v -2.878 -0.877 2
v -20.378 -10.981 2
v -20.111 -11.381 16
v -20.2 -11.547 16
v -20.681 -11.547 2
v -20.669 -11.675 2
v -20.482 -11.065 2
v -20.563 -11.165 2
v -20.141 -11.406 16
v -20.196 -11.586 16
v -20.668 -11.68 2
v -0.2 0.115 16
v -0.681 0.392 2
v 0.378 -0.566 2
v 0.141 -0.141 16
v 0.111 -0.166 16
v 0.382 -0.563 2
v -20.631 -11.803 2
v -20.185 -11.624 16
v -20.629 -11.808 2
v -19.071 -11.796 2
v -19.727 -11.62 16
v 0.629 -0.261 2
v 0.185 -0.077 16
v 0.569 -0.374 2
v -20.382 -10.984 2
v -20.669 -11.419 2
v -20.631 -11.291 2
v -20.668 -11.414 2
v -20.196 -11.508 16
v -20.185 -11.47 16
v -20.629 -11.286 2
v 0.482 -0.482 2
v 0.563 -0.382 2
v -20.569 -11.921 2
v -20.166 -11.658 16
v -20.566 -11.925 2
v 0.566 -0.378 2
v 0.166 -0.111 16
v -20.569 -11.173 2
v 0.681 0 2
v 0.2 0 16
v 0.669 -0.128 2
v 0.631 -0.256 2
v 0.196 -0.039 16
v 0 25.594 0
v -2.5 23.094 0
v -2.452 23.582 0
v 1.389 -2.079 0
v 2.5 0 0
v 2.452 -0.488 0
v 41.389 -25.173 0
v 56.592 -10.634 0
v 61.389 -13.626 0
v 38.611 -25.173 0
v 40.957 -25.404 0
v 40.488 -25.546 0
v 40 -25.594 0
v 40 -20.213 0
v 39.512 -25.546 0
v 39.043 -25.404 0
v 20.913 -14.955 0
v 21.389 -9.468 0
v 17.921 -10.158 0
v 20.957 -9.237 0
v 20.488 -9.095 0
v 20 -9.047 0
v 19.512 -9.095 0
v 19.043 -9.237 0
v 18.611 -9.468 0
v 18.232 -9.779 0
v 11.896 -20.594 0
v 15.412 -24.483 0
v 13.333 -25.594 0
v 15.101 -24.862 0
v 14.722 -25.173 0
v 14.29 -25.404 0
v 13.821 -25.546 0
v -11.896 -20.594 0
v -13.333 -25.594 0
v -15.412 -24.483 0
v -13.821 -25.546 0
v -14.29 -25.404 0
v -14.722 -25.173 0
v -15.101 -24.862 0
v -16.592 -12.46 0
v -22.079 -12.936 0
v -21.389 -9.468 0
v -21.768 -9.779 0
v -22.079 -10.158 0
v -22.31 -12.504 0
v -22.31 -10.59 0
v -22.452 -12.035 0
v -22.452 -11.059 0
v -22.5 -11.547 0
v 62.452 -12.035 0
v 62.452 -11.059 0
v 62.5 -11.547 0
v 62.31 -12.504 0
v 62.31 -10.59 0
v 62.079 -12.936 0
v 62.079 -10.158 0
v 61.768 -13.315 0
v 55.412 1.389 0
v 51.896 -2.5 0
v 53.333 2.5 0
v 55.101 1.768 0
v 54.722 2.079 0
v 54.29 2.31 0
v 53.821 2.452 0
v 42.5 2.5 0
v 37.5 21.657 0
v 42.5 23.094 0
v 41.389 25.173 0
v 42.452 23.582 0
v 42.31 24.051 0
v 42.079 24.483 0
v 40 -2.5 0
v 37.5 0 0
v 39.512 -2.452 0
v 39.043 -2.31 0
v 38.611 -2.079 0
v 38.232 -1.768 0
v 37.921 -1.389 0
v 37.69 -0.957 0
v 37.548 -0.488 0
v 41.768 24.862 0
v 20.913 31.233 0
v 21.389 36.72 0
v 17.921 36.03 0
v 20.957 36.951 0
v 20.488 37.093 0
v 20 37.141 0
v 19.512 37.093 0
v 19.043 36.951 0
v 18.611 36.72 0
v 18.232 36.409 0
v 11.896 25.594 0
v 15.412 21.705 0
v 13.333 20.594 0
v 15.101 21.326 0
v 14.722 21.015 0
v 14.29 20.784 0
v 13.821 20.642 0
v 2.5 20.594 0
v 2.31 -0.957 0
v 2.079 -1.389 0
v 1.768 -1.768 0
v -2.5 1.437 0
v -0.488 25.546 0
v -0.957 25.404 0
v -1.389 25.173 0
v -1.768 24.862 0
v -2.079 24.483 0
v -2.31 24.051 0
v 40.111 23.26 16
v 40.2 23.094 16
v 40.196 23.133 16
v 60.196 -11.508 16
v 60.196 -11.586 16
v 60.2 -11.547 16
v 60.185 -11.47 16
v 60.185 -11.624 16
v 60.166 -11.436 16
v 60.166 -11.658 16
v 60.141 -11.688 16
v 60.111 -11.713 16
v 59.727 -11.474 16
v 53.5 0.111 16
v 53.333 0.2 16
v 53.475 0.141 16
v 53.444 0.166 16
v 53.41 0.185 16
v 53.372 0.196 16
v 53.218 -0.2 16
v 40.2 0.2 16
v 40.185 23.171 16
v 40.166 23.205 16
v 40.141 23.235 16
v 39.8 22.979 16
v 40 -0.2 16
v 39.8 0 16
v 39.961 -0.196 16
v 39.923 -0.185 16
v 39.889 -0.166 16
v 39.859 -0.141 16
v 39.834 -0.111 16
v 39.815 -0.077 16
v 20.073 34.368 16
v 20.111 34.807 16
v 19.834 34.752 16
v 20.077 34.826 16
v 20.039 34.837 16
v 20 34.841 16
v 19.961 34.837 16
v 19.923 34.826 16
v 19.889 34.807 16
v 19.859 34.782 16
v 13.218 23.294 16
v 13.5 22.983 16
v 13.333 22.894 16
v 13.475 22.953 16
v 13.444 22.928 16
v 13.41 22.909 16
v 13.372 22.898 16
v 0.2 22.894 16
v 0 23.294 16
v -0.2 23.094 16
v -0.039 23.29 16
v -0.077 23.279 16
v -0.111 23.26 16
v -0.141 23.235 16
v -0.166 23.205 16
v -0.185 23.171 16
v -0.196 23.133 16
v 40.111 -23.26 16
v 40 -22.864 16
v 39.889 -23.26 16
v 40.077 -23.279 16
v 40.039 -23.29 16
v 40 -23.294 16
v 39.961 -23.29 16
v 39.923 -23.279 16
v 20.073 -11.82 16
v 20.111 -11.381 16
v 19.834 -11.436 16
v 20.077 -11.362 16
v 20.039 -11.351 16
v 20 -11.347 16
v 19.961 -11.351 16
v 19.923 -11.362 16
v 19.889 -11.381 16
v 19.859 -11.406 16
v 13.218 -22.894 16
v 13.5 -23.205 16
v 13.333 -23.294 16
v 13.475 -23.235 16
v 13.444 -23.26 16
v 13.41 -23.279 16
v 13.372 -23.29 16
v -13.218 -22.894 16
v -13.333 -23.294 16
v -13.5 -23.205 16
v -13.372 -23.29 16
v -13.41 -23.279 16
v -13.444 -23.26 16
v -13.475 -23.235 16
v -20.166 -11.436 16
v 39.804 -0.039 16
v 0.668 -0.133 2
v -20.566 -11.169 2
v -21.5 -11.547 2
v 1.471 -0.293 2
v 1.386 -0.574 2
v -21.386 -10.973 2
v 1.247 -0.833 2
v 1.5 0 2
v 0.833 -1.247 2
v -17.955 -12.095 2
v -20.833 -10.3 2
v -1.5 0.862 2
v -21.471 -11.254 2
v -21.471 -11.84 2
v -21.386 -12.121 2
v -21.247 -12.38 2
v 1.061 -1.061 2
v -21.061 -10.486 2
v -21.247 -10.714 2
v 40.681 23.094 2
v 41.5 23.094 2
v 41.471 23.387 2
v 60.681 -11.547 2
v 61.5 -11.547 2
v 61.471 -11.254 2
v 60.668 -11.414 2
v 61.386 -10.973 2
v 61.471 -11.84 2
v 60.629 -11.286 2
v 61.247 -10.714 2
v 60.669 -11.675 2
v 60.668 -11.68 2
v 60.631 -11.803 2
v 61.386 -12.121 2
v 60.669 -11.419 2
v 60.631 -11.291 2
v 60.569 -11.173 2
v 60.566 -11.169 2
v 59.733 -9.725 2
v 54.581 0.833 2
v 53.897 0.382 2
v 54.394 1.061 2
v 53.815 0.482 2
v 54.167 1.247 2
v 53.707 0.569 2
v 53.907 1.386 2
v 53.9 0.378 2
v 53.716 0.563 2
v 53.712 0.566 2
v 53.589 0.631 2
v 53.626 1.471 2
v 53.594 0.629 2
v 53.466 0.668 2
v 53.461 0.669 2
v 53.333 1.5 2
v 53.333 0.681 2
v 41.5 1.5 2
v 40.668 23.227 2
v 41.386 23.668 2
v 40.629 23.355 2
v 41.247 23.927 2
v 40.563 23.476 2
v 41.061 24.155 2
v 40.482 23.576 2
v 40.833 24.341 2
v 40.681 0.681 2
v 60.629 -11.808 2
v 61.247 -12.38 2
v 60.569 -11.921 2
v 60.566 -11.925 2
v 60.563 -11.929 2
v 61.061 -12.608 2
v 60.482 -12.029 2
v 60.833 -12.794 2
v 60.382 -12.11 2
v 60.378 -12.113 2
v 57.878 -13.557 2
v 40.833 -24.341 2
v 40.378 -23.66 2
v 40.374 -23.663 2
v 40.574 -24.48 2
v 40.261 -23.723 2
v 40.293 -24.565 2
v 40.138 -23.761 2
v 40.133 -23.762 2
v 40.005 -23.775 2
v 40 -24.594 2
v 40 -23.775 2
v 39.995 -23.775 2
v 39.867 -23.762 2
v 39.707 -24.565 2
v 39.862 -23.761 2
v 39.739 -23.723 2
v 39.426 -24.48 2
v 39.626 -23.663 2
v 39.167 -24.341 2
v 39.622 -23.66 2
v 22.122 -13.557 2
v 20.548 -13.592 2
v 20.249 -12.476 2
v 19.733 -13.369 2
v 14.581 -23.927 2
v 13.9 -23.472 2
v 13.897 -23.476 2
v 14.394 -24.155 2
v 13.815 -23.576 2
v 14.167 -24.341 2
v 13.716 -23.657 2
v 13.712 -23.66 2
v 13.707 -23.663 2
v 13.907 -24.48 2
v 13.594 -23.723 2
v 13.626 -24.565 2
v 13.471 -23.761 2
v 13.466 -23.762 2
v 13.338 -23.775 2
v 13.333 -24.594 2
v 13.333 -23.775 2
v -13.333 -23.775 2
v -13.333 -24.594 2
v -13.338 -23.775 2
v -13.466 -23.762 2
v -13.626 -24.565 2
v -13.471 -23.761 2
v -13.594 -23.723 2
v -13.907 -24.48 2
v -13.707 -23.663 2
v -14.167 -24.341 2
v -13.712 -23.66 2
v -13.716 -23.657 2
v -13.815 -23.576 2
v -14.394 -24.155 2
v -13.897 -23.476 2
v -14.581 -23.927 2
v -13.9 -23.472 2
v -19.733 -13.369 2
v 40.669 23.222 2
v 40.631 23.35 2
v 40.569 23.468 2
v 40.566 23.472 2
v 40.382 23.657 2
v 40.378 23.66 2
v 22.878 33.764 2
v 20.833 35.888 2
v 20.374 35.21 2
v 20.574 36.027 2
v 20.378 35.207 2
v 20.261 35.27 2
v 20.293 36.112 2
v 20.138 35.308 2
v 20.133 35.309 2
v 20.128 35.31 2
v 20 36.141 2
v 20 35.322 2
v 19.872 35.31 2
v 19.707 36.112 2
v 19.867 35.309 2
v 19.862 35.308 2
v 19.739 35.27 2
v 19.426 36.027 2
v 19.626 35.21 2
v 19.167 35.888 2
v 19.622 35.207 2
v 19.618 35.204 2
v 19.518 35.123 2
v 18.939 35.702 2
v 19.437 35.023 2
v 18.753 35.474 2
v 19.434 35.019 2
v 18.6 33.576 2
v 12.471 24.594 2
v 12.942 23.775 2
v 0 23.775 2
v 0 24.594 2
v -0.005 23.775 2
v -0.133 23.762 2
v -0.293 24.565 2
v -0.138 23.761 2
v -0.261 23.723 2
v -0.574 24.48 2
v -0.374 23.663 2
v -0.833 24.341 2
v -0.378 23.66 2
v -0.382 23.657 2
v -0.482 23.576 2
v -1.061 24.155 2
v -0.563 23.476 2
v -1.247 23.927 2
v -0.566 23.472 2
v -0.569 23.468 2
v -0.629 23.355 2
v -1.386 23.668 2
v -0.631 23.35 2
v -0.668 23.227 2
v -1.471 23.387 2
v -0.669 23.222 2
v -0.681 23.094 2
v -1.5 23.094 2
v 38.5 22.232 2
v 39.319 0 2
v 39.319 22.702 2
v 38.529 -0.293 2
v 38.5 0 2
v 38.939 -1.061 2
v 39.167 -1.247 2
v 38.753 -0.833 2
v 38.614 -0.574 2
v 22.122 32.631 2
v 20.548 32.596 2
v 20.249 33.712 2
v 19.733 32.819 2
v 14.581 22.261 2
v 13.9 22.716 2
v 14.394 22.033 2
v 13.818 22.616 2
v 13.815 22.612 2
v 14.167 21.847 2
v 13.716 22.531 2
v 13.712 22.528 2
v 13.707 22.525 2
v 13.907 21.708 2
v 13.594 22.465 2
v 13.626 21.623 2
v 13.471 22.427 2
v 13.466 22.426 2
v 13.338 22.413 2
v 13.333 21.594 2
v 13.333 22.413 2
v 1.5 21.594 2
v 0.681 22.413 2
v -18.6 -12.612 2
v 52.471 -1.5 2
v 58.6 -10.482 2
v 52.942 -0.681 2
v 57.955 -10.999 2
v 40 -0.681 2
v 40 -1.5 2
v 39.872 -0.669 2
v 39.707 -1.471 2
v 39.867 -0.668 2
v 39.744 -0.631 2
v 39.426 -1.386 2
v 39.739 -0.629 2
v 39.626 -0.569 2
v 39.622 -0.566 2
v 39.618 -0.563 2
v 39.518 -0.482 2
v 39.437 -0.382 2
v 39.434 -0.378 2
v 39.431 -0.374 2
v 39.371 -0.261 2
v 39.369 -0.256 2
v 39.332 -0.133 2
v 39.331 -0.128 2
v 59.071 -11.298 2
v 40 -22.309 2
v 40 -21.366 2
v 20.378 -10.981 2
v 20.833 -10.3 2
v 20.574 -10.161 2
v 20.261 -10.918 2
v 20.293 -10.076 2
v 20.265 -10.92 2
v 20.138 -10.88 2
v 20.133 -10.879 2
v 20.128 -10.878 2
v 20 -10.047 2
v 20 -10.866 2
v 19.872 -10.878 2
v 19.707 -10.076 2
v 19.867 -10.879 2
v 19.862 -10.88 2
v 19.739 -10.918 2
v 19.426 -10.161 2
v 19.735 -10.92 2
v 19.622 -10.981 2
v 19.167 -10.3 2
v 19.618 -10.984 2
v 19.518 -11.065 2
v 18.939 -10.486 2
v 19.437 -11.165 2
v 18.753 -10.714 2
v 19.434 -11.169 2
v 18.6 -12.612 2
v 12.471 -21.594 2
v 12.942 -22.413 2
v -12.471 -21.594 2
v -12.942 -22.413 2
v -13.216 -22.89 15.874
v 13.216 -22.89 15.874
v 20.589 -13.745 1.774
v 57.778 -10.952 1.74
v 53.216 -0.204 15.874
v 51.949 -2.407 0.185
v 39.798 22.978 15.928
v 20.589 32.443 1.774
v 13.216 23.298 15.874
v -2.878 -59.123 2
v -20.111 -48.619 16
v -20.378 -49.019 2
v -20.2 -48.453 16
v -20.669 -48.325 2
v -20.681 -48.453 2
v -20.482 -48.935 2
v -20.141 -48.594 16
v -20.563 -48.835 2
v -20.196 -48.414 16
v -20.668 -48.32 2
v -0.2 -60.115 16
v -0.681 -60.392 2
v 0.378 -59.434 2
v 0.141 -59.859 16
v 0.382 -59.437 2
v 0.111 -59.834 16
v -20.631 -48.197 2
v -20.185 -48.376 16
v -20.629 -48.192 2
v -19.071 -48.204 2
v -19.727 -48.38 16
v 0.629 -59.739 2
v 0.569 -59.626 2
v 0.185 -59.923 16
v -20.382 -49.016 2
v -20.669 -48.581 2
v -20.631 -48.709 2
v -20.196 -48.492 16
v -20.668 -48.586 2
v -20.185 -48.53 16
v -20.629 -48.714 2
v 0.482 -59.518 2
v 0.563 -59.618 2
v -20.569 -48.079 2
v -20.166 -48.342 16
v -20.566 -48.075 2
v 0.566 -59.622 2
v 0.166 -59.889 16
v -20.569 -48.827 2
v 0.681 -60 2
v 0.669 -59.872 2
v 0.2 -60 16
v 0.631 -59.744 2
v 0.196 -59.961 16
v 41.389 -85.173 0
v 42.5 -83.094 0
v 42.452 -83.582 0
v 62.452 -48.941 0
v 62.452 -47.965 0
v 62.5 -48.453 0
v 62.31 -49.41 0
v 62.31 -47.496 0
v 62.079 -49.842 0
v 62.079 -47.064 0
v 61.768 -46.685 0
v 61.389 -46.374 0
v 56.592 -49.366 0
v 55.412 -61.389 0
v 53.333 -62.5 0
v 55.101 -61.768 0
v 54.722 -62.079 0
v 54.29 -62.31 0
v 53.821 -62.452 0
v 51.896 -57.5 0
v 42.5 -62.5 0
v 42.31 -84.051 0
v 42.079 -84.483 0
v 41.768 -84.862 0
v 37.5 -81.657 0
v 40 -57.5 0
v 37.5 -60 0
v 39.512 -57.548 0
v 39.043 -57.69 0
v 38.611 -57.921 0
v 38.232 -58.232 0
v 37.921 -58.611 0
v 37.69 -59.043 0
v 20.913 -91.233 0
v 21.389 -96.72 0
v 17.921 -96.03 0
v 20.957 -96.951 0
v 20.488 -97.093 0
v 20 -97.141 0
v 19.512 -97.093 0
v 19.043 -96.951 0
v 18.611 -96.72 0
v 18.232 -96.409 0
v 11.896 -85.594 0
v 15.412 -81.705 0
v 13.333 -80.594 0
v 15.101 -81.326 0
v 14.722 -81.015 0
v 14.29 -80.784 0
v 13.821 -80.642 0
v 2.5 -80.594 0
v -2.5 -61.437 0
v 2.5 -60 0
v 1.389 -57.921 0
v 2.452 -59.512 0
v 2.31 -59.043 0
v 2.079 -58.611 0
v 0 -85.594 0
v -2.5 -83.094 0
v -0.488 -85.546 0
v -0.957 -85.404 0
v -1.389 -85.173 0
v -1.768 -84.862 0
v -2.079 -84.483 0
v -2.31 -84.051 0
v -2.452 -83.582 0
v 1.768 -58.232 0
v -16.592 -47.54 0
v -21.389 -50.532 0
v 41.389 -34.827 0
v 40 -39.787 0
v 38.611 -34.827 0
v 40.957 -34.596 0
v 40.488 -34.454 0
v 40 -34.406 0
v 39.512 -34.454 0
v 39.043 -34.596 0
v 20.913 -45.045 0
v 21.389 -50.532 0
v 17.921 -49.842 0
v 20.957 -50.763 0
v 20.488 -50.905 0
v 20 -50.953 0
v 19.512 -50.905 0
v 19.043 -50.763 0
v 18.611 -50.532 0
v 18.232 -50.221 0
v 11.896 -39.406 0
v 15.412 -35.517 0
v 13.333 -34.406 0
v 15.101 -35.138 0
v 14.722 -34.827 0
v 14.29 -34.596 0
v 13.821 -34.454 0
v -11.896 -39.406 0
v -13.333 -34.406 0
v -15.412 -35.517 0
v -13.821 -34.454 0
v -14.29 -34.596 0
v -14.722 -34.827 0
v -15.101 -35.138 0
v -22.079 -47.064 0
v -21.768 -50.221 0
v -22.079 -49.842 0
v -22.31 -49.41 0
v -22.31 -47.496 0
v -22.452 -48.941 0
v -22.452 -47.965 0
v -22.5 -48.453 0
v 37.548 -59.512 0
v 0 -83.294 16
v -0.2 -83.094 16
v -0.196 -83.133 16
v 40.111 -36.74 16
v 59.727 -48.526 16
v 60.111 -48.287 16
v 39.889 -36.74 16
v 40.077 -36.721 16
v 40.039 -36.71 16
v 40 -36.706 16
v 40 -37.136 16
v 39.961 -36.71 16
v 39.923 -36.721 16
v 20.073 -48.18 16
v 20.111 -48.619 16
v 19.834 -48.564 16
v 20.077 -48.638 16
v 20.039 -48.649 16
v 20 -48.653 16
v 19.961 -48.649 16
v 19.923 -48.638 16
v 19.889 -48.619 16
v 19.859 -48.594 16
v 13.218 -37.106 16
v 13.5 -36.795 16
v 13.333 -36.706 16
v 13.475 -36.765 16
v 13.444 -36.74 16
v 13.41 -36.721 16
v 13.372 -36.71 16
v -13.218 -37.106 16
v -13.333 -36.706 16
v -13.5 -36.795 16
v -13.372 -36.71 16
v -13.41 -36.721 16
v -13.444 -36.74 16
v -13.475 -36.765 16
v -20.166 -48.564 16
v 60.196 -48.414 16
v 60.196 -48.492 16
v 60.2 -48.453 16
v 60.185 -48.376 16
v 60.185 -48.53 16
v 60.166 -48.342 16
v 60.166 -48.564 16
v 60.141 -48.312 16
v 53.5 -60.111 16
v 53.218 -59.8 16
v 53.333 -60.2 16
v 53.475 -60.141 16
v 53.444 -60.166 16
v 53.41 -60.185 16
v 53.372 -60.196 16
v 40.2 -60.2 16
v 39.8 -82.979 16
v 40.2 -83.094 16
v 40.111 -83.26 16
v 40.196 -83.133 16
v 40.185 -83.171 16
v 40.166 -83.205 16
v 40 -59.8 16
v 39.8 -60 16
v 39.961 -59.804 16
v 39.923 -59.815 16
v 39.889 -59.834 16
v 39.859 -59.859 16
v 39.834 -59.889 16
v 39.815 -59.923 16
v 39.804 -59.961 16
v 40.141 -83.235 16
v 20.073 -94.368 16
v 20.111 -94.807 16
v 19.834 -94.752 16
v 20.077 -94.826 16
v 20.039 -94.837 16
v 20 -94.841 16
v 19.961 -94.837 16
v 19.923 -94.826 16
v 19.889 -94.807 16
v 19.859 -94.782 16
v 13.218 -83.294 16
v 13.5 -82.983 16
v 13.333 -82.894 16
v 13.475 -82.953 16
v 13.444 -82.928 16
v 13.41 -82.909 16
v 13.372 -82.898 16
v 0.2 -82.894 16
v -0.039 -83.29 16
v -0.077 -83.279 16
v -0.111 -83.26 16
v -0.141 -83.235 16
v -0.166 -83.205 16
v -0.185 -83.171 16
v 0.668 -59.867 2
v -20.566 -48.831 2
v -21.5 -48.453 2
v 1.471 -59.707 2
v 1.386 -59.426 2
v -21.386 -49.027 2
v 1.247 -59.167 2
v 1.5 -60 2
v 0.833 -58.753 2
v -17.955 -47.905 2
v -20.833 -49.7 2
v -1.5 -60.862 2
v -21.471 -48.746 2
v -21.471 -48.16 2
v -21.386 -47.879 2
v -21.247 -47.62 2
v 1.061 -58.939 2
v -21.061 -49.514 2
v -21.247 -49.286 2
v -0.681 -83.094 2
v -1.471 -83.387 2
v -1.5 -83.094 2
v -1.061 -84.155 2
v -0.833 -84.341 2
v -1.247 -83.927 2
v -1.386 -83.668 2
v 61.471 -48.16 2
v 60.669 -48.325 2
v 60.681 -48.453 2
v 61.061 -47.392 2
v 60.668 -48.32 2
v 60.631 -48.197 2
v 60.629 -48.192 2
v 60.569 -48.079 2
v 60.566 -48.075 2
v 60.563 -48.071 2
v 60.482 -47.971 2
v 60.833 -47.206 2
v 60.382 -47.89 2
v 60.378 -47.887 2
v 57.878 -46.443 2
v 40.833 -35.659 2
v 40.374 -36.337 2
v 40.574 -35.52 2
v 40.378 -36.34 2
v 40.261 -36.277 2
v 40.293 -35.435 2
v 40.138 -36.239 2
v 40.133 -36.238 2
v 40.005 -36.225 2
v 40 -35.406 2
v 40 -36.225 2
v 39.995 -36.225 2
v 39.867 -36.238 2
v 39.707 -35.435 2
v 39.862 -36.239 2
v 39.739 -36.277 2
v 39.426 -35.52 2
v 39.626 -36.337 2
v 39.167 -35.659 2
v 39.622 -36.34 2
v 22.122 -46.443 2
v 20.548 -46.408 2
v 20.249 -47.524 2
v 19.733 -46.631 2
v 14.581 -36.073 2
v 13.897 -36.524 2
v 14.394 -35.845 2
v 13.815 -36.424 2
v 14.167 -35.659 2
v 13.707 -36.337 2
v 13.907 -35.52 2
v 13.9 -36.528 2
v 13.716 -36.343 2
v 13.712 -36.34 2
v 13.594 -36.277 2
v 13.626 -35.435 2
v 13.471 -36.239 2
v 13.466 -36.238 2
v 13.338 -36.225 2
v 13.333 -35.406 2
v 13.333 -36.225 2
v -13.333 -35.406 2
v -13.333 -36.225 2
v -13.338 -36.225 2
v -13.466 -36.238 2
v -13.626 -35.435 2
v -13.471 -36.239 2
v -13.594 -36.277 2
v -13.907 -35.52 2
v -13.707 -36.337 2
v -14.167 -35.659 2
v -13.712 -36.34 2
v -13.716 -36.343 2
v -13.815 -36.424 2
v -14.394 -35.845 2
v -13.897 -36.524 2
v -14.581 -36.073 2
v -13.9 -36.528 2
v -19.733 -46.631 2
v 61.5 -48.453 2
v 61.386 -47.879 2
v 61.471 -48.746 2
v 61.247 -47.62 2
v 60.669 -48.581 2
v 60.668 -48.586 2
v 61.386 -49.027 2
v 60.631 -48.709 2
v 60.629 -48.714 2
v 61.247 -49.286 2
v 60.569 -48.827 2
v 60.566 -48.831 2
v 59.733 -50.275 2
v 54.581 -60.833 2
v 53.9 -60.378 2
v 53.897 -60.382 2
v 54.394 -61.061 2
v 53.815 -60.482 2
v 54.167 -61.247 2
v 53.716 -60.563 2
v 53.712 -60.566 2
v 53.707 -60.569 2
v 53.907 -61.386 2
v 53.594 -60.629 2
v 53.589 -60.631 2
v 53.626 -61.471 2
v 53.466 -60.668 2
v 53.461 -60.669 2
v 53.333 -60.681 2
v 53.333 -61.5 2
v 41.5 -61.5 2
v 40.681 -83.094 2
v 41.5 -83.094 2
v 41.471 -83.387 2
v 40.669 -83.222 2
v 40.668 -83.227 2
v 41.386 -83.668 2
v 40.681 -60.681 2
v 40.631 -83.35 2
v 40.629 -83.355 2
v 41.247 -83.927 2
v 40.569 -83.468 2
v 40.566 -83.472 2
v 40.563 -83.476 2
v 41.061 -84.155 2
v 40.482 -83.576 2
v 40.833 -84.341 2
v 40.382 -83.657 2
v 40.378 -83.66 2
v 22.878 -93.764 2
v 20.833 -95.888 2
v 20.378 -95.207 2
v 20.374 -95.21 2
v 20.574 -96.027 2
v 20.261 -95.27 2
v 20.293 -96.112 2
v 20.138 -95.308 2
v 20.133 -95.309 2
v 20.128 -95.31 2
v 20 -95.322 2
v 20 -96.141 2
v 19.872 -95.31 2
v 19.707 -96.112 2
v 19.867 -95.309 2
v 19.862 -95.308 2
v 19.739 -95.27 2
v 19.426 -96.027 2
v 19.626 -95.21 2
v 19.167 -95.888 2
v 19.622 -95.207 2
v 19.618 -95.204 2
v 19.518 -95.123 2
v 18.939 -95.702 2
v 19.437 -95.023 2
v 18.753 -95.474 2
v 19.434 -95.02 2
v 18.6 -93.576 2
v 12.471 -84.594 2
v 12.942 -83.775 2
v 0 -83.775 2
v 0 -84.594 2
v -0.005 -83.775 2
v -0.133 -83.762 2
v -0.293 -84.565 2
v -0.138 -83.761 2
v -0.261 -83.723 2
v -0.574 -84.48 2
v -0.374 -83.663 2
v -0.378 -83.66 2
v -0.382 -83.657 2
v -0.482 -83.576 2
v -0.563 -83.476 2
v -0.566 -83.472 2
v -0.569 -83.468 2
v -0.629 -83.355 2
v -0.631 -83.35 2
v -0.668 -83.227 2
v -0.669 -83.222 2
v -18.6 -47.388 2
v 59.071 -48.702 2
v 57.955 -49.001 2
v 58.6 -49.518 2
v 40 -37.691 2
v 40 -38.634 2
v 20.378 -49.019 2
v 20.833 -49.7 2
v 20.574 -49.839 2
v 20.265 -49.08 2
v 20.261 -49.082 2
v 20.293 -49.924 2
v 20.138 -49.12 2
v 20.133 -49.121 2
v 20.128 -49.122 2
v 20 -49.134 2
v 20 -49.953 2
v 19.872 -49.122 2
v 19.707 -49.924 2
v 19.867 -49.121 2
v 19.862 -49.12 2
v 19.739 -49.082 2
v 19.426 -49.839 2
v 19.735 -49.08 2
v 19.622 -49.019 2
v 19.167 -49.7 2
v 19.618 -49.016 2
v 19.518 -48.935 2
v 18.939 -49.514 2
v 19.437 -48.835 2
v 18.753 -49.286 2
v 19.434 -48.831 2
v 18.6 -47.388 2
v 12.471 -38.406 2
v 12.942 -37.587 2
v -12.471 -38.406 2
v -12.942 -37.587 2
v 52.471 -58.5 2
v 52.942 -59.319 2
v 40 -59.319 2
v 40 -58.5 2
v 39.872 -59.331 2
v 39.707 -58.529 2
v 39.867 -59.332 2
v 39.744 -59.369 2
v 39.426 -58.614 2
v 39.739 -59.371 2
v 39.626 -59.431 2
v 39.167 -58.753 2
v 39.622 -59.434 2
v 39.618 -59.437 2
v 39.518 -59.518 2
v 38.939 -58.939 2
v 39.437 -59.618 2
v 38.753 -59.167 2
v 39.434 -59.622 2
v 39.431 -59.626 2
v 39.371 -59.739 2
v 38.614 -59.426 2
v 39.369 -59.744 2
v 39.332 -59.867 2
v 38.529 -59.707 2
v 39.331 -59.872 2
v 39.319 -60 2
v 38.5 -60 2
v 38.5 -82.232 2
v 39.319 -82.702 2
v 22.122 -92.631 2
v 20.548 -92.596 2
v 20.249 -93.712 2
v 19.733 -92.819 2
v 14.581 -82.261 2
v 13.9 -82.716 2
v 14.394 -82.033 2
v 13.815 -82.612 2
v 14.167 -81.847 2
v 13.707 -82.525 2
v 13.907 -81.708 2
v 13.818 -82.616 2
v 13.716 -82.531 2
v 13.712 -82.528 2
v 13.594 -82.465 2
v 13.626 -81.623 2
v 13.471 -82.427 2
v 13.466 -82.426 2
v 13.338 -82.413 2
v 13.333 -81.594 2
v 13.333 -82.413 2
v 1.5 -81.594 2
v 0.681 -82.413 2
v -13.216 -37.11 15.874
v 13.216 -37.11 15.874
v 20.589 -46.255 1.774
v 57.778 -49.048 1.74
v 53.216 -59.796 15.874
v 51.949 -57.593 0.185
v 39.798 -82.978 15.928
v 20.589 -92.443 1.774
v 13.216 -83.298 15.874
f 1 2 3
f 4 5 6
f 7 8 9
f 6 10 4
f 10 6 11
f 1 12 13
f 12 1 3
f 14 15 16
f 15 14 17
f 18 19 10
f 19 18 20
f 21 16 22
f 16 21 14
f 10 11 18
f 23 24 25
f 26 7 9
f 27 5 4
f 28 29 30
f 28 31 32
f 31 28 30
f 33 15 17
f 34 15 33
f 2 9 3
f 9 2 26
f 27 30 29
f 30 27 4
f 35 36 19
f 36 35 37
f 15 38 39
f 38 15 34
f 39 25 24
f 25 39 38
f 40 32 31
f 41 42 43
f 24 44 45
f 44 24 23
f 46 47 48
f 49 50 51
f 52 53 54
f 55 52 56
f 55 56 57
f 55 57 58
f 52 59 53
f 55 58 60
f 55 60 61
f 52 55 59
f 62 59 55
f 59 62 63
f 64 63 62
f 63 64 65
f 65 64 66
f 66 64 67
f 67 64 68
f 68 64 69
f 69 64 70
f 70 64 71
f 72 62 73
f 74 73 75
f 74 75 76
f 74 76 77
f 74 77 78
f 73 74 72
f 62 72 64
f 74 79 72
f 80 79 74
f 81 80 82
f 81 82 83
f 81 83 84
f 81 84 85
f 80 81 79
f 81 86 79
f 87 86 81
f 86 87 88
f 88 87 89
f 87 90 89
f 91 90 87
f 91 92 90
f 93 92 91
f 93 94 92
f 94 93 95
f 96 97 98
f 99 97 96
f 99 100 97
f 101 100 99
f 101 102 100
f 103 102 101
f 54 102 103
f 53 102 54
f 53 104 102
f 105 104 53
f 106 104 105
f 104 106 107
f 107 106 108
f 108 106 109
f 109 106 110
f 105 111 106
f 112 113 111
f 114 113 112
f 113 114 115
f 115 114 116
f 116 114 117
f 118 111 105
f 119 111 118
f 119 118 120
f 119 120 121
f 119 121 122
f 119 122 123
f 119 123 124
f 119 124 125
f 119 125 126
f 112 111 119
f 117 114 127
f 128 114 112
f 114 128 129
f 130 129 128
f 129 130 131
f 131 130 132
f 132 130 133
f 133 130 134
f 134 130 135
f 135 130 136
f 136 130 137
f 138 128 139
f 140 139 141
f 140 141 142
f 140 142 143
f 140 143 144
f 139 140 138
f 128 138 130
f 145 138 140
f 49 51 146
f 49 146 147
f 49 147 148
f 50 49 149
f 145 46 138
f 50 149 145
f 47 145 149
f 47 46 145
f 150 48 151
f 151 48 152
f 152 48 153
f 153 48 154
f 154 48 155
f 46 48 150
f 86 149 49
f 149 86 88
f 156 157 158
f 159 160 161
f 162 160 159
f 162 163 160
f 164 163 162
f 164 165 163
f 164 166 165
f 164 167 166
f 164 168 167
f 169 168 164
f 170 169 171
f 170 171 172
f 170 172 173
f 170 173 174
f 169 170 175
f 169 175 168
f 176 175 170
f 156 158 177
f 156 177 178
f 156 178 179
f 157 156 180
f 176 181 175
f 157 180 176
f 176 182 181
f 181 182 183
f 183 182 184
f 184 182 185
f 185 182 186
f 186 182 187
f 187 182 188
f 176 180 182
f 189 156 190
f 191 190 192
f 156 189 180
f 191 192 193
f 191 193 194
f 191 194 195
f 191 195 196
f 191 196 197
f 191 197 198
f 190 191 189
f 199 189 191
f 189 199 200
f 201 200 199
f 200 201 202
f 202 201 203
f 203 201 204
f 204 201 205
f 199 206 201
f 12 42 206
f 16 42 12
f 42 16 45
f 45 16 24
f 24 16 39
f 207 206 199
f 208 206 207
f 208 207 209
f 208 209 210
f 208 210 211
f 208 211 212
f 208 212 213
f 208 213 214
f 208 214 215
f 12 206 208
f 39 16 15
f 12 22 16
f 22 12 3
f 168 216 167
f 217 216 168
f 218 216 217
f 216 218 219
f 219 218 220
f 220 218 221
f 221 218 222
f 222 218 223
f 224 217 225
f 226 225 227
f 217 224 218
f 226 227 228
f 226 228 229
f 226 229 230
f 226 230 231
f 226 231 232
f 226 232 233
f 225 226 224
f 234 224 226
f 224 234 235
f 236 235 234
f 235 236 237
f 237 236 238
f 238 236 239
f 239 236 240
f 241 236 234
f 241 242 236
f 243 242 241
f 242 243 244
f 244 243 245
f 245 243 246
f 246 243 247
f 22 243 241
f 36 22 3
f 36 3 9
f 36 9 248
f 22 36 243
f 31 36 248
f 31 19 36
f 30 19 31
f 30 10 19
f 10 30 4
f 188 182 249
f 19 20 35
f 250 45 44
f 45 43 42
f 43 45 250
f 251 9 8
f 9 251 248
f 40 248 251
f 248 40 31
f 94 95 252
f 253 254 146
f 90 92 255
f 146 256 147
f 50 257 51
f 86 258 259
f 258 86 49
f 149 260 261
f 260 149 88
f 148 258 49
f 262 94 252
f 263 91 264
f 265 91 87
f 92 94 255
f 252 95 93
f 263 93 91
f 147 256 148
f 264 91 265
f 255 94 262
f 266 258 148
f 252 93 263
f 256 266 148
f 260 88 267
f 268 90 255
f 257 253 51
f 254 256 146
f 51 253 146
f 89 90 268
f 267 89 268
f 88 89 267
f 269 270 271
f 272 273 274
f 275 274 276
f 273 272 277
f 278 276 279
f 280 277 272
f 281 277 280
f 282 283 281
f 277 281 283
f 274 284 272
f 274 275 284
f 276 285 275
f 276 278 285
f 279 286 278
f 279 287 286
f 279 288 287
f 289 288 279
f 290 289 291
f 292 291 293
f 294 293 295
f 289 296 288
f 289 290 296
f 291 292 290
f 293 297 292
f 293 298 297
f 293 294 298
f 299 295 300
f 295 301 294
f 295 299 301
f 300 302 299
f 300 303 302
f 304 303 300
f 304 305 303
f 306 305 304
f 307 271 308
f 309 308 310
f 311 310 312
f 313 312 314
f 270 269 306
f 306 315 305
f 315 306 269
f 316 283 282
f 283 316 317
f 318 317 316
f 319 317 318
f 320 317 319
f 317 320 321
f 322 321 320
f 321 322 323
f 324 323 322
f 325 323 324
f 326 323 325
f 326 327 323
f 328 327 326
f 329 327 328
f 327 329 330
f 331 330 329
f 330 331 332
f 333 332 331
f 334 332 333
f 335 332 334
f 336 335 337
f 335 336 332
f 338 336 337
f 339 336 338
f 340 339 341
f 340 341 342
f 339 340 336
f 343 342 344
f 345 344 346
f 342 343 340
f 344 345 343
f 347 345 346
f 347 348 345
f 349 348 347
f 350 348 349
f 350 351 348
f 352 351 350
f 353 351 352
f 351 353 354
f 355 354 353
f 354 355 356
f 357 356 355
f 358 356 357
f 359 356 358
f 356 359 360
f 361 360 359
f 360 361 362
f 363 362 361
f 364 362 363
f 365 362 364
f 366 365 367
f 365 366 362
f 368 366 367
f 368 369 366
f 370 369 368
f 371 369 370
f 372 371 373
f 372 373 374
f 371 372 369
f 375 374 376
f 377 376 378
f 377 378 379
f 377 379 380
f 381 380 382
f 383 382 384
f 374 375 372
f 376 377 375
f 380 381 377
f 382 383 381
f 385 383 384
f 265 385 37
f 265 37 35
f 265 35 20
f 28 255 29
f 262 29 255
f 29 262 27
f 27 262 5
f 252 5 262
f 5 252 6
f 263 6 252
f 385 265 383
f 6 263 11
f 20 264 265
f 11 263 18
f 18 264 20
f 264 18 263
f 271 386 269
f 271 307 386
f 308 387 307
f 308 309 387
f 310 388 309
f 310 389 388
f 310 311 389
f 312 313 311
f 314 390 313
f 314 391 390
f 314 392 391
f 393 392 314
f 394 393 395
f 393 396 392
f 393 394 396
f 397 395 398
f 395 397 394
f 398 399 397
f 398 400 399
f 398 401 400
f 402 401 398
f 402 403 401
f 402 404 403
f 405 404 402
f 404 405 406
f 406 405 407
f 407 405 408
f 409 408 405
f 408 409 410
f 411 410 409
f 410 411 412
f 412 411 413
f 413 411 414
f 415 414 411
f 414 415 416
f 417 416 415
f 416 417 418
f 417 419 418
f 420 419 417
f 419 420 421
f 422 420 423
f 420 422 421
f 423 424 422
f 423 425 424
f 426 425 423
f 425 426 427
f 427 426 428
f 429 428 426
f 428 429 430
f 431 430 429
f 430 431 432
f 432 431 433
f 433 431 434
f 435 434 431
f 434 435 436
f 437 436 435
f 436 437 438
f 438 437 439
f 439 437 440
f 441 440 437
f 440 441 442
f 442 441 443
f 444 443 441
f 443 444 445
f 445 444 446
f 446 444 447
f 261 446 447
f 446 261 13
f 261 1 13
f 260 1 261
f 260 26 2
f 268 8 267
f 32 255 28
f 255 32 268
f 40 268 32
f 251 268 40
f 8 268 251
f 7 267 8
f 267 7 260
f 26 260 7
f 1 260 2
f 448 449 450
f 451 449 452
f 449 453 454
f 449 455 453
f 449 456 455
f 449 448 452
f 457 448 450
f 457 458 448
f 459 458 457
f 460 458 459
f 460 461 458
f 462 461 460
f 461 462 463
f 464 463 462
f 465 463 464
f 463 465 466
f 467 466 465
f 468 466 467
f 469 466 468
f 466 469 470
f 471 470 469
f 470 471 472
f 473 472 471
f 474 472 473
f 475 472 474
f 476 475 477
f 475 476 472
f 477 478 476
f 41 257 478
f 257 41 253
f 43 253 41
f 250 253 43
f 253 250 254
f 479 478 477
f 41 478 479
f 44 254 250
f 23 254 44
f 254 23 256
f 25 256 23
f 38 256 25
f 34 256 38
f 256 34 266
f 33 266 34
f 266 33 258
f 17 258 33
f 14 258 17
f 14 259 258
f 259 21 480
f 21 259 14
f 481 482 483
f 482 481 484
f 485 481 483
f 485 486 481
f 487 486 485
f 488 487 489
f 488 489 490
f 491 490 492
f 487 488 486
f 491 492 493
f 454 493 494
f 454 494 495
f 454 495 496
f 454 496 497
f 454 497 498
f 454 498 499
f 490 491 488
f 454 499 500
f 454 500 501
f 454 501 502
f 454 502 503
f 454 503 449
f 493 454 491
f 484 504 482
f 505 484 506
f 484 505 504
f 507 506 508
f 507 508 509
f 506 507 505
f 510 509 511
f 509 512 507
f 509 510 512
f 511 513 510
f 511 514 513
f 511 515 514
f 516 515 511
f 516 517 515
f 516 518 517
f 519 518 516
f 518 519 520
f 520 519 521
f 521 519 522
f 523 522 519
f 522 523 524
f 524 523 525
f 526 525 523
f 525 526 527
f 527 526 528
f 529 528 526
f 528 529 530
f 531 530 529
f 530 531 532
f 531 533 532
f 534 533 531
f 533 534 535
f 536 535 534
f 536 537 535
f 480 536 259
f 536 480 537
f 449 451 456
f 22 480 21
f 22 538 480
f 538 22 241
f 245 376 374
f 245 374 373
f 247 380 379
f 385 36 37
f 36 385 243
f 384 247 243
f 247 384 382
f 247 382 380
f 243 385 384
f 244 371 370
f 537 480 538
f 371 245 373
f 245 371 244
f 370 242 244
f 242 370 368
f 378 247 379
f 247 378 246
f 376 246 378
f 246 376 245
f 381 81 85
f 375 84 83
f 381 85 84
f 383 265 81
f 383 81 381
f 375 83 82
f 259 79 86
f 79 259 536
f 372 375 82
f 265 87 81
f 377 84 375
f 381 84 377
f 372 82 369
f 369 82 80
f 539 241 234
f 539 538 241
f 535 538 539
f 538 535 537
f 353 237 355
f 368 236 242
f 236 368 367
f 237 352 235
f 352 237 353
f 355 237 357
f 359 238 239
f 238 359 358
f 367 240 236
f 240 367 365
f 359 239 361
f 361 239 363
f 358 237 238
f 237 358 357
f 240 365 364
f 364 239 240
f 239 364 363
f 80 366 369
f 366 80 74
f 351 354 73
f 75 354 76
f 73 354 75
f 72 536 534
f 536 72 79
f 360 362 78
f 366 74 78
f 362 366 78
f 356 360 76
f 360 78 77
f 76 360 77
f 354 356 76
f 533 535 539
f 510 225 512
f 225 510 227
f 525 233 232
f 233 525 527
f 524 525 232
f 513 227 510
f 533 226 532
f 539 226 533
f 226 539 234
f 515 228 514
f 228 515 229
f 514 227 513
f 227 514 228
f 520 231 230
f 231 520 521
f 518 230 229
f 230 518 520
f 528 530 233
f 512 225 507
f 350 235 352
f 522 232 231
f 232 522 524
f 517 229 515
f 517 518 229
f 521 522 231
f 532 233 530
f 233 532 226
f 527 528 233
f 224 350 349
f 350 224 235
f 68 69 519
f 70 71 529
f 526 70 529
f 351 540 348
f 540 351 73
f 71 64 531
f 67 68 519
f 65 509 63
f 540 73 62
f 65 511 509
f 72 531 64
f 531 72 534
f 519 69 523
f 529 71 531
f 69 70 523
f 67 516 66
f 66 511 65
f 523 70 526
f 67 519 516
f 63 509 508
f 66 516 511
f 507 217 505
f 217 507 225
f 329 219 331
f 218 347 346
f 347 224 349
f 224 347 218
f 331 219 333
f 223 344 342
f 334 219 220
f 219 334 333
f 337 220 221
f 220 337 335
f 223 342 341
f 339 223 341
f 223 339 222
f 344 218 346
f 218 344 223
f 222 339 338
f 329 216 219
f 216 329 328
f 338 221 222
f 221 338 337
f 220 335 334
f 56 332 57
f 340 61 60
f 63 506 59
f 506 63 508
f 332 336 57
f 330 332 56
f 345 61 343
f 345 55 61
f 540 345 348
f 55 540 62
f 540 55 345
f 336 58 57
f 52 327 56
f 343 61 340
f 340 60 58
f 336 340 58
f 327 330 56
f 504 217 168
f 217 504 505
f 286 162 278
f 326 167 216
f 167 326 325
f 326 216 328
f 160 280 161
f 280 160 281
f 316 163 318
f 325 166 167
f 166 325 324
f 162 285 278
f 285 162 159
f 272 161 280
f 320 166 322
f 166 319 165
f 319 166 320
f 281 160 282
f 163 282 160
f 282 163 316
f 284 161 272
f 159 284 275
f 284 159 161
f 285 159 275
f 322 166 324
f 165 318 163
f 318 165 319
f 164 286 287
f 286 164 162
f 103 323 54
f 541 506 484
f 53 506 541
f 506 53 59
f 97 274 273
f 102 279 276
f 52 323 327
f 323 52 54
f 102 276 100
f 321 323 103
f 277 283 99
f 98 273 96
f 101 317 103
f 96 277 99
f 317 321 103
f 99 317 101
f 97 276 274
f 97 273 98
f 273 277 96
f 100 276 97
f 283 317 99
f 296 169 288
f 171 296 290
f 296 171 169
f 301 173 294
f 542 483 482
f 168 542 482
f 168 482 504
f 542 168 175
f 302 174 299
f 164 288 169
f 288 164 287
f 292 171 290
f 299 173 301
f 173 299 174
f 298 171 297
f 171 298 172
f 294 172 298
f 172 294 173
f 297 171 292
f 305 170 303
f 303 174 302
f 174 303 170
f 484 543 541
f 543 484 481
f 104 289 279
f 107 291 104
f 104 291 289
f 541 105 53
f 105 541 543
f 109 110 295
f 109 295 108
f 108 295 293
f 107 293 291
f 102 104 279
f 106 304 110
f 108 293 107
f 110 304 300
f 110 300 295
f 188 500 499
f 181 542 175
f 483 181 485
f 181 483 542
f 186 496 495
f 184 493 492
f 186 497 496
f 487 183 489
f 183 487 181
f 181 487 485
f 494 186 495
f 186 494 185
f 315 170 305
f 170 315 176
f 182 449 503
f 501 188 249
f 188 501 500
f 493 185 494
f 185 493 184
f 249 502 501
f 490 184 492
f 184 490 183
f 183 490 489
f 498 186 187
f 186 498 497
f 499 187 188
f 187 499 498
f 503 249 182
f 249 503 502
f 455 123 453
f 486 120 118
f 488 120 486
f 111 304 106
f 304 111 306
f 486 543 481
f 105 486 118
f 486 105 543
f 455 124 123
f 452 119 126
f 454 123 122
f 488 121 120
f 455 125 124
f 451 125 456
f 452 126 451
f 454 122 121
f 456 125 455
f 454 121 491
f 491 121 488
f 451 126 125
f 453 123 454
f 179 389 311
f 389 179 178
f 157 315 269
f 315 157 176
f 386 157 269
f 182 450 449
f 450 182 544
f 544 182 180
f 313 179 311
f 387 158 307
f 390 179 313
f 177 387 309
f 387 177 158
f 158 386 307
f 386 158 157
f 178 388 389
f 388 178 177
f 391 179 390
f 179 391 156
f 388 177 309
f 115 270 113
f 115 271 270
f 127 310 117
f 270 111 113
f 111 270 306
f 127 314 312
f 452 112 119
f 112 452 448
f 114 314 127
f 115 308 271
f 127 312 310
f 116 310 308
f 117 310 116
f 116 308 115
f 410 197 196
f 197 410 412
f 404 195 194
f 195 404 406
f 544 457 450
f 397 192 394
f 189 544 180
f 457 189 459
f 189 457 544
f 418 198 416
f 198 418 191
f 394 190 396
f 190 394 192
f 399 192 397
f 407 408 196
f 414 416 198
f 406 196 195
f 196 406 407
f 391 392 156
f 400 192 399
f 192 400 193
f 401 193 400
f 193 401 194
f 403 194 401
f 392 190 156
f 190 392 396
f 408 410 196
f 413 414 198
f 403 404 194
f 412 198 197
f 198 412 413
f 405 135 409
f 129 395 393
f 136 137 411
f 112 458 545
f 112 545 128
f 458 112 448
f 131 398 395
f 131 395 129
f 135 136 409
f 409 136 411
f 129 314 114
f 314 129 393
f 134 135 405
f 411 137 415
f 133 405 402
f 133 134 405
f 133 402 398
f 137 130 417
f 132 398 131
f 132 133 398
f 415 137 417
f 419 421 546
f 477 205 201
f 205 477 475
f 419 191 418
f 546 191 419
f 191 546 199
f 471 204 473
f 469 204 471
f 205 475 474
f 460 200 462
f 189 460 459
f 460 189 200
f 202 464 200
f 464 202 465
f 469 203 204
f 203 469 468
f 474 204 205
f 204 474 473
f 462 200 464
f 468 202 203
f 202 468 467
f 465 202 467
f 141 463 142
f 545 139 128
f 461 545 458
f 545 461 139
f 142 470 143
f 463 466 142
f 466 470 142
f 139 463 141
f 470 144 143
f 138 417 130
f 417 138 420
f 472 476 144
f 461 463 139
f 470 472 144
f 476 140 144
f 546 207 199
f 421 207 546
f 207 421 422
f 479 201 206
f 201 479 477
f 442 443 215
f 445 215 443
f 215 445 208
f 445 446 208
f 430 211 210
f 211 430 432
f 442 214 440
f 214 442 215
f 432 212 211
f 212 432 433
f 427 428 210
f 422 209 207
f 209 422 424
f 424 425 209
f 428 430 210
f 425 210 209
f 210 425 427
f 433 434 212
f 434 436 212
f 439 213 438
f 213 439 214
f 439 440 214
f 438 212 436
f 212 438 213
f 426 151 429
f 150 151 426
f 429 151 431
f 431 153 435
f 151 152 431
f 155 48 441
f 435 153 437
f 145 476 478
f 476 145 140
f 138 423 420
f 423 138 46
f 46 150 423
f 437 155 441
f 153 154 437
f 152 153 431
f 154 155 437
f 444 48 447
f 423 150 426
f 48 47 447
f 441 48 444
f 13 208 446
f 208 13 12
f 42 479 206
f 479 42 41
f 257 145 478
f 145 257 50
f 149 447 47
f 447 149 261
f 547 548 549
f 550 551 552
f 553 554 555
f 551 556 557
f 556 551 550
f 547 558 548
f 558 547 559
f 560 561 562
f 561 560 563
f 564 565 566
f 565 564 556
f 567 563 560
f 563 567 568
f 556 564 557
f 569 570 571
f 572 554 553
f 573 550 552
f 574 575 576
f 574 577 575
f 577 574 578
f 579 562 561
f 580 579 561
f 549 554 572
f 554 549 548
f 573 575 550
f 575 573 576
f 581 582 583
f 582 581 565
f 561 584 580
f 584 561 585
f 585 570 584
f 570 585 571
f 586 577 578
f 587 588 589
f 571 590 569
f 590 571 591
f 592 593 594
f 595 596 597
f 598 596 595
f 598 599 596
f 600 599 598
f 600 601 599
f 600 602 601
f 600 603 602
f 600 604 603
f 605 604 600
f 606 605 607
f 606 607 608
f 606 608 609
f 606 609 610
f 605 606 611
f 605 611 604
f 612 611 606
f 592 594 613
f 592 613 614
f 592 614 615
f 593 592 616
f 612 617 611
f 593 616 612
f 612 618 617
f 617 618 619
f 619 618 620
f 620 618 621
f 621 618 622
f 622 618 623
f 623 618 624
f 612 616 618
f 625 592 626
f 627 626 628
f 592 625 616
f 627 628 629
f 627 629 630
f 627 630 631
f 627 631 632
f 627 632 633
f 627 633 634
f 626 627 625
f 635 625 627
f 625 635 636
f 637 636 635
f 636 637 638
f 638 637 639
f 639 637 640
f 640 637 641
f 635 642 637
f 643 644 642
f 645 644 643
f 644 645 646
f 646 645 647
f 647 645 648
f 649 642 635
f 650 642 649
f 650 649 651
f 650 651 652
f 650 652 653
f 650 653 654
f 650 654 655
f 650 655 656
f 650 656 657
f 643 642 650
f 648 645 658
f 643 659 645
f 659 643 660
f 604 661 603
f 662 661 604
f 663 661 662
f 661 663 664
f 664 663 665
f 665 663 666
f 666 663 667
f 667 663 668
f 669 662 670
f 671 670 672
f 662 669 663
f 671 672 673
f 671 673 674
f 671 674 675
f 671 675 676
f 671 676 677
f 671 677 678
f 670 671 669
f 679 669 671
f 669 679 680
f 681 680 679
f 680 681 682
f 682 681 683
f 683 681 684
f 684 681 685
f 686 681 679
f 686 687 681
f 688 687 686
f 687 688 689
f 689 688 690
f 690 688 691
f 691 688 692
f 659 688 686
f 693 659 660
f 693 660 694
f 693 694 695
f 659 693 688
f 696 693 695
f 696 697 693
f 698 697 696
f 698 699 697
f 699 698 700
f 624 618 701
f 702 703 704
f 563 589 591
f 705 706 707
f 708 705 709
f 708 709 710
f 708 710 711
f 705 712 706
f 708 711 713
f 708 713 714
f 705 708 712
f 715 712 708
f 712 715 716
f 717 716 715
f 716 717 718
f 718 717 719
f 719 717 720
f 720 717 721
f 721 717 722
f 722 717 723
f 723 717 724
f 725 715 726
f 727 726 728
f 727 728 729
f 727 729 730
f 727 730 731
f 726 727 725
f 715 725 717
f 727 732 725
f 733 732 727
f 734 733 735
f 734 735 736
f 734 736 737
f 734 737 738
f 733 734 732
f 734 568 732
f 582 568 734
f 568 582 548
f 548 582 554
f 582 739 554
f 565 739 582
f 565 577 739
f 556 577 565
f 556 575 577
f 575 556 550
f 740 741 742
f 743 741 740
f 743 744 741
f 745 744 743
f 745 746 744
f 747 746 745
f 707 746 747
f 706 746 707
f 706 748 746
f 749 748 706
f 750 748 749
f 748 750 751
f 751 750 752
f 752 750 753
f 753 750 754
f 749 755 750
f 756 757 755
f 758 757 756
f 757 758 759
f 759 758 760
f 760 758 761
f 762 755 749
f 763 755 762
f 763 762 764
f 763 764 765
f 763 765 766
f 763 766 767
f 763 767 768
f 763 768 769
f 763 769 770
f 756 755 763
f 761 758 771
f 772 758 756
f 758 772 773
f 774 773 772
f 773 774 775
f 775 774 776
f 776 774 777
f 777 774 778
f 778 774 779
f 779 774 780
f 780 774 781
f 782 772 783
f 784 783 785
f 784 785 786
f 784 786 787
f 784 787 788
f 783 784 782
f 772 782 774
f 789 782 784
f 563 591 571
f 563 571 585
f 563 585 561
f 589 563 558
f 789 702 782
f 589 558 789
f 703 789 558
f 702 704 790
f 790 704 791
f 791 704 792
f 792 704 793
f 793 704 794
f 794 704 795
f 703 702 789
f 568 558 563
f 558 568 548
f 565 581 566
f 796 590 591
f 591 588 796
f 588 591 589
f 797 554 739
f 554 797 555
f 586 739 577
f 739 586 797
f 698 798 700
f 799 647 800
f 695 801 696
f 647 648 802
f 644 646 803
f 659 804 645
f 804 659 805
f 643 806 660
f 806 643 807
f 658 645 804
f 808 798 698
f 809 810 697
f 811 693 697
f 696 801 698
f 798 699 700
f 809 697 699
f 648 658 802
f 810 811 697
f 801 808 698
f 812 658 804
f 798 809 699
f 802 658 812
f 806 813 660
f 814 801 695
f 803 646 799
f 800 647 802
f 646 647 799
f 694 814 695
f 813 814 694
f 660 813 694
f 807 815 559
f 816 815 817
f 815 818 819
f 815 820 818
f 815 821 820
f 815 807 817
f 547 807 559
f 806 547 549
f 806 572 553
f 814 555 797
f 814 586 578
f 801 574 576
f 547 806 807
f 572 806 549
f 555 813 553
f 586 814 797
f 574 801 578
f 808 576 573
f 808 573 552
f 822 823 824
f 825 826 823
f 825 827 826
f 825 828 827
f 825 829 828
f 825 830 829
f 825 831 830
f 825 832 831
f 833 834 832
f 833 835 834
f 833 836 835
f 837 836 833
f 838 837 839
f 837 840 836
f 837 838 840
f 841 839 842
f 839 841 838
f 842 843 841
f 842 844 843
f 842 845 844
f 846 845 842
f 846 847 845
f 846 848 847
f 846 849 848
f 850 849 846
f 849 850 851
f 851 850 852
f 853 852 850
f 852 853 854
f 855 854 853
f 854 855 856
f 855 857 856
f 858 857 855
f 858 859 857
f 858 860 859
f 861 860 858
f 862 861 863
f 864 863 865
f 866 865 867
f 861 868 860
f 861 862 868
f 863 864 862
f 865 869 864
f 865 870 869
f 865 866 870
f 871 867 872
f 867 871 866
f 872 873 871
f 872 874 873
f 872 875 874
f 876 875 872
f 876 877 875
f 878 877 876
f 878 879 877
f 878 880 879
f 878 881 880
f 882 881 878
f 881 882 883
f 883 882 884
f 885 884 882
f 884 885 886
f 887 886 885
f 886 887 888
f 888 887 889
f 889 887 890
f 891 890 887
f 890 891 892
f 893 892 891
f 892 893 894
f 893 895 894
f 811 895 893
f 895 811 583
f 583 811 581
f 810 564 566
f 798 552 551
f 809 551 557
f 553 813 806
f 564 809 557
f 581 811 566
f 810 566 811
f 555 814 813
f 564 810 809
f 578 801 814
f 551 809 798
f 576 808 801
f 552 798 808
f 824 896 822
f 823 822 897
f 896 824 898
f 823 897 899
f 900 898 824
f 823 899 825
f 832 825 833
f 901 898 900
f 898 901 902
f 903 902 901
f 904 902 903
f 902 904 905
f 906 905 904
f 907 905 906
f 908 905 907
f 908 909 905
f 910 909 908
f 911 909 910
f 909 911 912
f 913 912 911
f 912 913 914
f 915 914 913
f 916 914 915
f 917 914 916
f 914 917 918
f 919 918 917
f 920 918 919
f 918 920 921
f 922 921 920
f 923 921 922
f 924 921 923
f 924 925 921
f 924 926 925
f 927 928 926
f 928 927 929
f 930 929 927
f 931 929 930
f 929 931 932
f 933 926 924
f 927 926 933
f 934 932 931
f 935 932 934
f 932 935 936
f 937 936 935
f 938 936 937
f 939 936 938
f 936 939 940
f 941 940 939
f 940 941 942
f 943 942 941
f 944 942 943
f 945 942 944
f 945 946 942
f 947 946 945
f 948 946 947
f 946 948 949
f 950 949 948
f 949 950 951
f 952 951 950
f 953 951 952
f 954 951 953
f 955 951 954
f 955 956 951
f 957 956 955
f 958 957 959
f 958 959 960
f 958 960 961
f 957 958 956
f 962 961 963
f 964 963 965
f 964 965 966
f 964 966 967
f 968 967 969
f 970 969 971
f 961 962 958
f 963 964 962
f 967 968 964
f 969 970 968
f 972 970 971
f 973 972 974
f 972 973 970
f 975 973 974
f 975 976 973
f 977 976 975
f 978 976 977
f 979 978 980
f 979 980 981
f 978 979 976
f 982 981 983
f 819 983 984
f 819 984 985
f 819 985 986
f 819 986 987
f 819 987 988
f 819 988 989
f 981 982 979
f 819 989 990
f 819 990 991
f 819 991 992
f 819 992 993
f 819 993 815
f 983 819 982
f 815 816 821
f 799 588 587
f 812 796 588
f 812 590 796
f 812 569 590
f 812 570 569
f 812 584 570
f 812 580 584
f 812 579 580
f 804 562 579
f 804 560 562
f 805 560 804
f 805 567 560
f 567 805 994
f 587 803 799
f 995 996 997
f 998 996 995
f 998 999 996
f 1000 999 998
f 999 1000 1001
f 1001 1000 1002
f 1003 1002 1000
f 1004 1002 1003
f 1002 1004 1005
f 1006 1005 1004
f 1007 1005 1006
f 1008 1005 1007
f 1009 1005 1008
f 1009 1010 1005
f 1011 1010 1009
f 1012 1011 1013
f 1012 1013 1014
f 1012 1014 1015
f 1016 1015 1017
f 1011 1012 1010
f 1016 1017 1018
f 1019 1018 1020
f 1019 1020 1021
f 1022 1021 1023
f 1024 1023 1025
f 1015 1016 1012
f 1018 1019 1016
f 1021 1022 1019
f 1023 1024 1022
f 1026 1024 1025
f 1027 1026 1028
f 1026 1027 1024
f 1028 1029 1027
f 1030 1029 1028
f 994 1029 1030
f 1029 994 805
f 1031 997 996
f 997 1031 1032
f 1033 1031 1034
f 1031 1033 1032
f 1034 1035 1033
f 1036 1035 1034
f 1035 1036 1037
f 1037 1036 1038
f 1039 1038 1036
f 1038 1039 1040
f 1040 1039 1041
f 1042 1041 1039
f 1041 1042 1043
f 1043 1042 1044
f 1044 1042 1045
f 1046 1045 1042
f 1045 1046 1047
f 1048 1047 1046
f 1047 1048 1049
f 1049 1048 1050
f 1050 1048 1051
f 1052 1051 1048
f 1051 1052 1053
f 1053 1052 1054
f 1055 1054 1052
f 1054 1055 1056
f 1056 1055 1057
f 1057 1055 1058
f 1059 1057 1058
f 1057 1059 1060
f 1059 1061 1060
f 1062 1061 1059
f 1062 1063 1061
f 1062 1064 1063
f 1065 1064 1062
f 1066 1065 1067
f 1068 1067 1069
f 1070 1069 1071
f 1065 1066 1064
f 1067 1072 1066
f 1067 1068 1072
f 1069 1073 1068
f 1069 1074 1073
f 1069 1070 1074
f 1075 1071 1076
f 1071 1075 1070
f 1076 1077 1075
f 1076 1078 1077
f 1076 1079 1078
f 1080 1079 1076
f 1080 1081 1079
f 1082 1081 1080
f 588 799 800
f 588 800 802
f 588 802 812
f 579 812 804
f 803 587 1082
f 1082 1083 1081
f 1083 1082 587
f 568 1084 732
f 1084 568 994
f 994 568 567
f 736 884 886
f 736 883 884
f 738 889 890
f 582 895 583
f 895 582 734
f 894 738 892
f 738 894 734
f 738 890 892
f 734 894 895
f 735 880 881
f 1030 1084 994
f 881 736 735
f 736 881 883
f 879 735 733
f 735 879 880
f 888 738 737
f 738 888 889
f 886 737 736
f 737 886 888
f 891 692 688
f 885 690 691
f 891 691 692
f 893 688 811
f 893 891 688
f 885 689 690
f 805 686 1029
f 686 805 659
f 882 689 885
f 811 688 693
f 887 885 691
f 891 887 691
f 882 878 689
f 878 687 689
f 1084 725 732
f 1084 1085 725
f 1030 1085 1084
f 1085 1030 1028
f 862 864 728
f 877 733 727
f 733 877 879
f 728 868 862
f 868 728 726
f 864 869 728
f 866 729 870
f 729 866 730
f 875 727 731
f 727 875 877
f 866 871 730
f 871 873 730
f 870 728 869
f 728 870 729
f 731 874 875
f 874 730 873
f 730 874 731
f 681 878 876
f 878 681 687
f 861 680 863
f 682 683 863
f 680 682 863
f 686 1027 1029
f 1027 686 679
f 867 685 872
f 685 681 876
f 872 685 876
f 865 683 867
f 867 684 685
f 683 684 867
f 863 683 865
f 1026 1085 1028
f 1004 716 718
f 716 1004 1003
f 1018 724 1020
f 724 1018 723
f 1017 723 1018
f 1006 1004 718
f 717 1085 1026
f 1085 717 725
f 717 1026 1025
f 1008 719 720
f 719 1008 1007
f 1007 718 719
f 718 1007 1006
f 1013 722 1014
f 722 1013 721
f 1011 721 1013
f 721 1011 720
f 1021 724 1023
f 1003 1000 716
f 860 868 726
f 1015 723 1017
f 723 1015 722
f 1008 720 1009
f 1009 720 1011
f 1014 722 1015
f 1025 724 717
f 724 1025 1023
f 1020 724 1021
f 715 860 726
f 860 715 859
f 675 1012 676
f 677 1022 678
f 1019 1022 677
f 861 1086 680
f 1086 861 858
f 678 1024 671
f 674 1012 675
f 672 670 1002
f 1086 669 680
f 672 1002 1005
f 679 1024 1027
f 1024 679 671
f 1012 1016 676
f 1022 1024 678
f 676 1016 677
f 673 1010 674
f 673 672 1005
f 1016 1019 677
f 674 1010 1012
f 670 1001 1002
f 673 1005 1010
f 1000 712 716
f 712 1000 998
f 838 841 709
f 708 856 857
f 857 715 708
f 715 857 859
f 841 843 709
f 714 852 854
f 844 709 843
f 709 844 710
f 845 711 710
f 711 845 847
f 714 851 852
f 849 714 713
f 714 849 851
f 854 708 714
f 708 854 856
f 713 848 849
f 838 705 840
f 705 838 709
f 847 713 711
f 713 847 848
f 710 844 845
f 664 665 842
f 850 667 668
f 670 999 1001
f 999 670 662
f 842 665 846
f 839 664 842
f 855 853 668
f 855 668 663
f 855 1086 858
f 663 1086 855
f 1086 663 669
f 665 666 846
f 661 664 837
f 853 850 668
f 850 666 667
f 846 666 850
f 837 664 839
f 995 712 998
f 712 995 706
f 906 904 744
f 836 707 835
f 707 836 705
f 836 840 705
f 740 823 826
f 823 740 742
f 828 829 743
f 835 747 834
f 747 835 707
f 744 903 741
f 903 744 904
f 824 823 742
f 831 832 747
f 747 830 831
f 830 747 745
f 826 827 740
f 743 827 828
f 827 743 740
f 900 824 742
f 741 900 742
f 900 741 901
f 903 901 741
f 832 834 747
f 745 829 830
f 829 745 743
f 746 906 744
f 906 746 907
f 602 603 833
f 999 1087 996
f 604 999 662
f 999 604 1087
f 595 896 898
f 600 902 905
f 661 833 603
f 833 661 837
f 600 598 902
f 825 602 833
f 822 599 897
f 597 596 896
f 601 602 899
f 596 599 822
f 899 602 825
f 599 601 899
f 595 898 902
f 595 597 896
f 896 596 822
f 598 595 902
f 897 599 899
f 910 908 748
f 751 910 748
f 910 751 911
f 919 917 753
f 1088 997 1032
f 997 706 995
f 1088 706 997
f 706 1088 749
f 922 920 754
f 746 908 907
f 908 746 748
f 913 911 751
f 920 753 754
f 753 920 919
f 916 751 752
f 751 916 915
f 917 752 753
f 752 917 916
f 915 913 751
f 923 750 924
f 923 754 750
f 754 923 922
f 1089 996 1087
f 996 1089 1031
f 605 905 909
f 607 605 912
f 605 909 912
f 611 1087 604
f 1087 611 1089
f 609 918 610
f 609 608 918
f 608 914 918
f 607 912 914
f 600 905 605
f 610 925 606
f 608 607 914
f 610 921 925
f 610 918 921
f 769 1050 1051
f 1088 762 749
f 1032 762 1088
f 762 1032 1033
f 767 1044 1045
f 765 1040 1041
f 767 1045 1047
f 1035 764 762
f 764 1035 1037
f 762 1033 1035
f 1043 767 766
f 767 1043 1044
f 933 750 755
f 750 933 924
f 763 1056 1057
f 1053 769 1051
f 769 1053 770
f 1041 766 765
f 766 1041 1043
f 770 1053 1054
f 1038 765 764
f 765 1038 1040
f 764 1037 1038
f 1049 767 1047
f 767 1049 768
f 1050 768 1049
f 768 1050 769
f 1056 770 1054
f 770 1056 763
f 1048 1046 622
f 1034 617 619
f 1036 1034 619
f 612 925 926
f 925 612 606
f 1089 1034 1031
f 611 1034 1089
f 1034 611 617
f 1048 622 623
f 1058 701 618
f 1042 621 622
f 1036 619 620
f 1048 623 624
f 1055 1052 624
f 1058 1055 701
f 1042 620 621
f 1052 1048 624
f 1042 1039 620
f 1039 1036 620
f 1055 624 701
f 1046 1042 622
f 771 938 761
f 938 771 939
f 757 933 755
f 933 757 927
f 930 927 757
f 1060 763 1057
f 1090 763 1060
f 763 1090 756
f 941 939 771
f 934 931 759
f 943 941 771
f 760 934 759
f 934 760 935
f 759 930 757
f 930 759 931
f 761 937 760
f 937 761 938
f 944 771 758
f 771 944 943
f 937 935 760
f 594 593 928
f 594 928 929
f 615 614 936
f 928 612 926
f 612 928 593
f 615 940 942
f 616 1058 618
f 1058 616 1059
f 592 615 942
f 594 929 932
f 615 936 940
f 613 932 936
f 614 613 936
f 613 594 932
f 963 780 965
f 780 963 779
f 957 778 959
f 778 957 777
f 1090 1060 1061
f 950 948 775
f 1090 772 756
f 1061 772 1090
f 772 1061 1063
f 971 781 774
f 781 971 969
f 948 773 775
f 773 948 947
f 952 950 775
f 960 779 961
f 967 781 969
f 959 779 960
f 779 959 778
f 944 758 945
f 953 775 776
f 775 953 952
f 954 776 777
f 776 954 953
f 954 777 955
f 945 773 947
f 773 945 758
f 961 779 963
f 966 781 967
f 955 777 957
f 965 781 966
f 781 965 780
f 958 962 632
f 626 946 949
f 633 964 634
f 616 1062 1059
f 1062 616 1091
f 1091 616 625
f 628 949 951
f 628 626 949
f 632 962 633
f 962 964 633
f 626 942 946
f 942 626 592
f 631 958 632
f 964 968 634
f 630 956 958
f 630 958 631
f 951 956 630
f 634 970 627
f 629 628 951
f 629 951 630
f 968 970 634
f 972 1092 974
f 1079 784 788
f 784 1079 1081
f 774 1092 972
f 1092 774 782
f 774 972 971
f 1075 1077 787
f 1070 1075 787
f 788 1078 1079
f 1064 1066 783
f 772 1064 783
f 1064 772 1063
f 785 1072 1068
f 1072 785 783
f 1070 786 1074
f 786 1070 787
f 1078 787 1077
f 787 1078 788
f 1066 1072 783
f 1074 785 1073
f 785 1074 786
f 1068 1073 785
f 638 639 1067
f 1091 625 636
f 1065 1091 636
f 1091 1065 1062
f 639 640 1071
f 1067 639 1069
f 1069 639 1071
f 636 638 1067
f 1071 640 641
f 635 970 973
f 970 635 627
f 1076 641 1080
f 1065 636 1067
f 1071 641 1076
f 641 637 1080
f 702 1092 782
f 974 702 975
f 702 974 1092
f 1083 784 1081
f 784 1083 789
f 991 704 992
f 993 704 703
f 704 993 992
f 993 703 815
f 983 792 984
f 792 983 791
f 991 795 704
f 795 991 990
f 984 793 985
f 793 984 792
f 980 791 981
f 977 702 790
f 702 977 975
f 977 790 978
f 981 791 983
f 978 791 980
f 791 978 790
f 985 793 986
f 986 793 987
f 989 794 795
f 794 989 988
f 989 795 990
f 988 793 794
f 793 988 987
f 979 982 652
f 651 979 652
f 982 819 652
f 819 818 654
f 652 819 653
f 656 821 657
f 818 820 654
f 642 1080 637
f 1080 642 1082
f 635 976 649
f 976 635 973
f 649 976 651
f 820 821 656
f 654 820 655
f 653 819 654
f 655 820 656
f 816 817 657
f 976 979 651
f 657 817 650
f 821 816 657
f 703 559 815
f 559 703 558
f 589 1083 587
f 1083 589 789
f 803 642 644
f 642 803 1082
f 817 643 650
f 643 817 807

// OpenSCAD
// An aperiodic monotile cookie cutter
// See https://cs.uwaterloo.ca/~csk/hat/

// width of cutter in mm
width = 80;

// height of cutter in mm
height = 16;

// nozzle diameter in mm (approx)
nozzle = 0.4;

$fn = 32;

/* [Hidden] */

points=[
    [0,0],
    [-1.5,-0.8660254037844386],
    [-1,-1.7320508075688772],
    [1,-1.7320508075688772],
    [1.5,-0.8660254037844386],
    [3,-1.7320508075688772],
    [4.5,-0.8660254037844386],
    [4,0],
    [3,0],
    [3,1.7320508075688772],
    [1.5,2.598076211353316],
    [1,1.7320508075688772],
    [0,1.7320508075688772]
  ];


module cutter() {
    for (n = [0 : len(points)-1]) {
        p1 = points[n] * width / 6;
        p2 = points[(n+1)%len(points)] * width / 6;
        
        hull() {
          translate(p1) cylinder(h=height,d1=1.5,d2=nozzle);
          translate(p2) cylinder(h=height,d1=1.5,d2=nozzle);
        }
        hull() {
          translate(p1) cylinder(h=2,d1=5,d2=3);
          translate(p2) cylinder(h=2,d1=5,d2=3);
        }        
    }
}

cutter();

// reflected version to save you flipping
// the dough ...
translate([0,-width/2-20,0]) mirror([1,0,0]) rotate([0,0,180]) cutter();
